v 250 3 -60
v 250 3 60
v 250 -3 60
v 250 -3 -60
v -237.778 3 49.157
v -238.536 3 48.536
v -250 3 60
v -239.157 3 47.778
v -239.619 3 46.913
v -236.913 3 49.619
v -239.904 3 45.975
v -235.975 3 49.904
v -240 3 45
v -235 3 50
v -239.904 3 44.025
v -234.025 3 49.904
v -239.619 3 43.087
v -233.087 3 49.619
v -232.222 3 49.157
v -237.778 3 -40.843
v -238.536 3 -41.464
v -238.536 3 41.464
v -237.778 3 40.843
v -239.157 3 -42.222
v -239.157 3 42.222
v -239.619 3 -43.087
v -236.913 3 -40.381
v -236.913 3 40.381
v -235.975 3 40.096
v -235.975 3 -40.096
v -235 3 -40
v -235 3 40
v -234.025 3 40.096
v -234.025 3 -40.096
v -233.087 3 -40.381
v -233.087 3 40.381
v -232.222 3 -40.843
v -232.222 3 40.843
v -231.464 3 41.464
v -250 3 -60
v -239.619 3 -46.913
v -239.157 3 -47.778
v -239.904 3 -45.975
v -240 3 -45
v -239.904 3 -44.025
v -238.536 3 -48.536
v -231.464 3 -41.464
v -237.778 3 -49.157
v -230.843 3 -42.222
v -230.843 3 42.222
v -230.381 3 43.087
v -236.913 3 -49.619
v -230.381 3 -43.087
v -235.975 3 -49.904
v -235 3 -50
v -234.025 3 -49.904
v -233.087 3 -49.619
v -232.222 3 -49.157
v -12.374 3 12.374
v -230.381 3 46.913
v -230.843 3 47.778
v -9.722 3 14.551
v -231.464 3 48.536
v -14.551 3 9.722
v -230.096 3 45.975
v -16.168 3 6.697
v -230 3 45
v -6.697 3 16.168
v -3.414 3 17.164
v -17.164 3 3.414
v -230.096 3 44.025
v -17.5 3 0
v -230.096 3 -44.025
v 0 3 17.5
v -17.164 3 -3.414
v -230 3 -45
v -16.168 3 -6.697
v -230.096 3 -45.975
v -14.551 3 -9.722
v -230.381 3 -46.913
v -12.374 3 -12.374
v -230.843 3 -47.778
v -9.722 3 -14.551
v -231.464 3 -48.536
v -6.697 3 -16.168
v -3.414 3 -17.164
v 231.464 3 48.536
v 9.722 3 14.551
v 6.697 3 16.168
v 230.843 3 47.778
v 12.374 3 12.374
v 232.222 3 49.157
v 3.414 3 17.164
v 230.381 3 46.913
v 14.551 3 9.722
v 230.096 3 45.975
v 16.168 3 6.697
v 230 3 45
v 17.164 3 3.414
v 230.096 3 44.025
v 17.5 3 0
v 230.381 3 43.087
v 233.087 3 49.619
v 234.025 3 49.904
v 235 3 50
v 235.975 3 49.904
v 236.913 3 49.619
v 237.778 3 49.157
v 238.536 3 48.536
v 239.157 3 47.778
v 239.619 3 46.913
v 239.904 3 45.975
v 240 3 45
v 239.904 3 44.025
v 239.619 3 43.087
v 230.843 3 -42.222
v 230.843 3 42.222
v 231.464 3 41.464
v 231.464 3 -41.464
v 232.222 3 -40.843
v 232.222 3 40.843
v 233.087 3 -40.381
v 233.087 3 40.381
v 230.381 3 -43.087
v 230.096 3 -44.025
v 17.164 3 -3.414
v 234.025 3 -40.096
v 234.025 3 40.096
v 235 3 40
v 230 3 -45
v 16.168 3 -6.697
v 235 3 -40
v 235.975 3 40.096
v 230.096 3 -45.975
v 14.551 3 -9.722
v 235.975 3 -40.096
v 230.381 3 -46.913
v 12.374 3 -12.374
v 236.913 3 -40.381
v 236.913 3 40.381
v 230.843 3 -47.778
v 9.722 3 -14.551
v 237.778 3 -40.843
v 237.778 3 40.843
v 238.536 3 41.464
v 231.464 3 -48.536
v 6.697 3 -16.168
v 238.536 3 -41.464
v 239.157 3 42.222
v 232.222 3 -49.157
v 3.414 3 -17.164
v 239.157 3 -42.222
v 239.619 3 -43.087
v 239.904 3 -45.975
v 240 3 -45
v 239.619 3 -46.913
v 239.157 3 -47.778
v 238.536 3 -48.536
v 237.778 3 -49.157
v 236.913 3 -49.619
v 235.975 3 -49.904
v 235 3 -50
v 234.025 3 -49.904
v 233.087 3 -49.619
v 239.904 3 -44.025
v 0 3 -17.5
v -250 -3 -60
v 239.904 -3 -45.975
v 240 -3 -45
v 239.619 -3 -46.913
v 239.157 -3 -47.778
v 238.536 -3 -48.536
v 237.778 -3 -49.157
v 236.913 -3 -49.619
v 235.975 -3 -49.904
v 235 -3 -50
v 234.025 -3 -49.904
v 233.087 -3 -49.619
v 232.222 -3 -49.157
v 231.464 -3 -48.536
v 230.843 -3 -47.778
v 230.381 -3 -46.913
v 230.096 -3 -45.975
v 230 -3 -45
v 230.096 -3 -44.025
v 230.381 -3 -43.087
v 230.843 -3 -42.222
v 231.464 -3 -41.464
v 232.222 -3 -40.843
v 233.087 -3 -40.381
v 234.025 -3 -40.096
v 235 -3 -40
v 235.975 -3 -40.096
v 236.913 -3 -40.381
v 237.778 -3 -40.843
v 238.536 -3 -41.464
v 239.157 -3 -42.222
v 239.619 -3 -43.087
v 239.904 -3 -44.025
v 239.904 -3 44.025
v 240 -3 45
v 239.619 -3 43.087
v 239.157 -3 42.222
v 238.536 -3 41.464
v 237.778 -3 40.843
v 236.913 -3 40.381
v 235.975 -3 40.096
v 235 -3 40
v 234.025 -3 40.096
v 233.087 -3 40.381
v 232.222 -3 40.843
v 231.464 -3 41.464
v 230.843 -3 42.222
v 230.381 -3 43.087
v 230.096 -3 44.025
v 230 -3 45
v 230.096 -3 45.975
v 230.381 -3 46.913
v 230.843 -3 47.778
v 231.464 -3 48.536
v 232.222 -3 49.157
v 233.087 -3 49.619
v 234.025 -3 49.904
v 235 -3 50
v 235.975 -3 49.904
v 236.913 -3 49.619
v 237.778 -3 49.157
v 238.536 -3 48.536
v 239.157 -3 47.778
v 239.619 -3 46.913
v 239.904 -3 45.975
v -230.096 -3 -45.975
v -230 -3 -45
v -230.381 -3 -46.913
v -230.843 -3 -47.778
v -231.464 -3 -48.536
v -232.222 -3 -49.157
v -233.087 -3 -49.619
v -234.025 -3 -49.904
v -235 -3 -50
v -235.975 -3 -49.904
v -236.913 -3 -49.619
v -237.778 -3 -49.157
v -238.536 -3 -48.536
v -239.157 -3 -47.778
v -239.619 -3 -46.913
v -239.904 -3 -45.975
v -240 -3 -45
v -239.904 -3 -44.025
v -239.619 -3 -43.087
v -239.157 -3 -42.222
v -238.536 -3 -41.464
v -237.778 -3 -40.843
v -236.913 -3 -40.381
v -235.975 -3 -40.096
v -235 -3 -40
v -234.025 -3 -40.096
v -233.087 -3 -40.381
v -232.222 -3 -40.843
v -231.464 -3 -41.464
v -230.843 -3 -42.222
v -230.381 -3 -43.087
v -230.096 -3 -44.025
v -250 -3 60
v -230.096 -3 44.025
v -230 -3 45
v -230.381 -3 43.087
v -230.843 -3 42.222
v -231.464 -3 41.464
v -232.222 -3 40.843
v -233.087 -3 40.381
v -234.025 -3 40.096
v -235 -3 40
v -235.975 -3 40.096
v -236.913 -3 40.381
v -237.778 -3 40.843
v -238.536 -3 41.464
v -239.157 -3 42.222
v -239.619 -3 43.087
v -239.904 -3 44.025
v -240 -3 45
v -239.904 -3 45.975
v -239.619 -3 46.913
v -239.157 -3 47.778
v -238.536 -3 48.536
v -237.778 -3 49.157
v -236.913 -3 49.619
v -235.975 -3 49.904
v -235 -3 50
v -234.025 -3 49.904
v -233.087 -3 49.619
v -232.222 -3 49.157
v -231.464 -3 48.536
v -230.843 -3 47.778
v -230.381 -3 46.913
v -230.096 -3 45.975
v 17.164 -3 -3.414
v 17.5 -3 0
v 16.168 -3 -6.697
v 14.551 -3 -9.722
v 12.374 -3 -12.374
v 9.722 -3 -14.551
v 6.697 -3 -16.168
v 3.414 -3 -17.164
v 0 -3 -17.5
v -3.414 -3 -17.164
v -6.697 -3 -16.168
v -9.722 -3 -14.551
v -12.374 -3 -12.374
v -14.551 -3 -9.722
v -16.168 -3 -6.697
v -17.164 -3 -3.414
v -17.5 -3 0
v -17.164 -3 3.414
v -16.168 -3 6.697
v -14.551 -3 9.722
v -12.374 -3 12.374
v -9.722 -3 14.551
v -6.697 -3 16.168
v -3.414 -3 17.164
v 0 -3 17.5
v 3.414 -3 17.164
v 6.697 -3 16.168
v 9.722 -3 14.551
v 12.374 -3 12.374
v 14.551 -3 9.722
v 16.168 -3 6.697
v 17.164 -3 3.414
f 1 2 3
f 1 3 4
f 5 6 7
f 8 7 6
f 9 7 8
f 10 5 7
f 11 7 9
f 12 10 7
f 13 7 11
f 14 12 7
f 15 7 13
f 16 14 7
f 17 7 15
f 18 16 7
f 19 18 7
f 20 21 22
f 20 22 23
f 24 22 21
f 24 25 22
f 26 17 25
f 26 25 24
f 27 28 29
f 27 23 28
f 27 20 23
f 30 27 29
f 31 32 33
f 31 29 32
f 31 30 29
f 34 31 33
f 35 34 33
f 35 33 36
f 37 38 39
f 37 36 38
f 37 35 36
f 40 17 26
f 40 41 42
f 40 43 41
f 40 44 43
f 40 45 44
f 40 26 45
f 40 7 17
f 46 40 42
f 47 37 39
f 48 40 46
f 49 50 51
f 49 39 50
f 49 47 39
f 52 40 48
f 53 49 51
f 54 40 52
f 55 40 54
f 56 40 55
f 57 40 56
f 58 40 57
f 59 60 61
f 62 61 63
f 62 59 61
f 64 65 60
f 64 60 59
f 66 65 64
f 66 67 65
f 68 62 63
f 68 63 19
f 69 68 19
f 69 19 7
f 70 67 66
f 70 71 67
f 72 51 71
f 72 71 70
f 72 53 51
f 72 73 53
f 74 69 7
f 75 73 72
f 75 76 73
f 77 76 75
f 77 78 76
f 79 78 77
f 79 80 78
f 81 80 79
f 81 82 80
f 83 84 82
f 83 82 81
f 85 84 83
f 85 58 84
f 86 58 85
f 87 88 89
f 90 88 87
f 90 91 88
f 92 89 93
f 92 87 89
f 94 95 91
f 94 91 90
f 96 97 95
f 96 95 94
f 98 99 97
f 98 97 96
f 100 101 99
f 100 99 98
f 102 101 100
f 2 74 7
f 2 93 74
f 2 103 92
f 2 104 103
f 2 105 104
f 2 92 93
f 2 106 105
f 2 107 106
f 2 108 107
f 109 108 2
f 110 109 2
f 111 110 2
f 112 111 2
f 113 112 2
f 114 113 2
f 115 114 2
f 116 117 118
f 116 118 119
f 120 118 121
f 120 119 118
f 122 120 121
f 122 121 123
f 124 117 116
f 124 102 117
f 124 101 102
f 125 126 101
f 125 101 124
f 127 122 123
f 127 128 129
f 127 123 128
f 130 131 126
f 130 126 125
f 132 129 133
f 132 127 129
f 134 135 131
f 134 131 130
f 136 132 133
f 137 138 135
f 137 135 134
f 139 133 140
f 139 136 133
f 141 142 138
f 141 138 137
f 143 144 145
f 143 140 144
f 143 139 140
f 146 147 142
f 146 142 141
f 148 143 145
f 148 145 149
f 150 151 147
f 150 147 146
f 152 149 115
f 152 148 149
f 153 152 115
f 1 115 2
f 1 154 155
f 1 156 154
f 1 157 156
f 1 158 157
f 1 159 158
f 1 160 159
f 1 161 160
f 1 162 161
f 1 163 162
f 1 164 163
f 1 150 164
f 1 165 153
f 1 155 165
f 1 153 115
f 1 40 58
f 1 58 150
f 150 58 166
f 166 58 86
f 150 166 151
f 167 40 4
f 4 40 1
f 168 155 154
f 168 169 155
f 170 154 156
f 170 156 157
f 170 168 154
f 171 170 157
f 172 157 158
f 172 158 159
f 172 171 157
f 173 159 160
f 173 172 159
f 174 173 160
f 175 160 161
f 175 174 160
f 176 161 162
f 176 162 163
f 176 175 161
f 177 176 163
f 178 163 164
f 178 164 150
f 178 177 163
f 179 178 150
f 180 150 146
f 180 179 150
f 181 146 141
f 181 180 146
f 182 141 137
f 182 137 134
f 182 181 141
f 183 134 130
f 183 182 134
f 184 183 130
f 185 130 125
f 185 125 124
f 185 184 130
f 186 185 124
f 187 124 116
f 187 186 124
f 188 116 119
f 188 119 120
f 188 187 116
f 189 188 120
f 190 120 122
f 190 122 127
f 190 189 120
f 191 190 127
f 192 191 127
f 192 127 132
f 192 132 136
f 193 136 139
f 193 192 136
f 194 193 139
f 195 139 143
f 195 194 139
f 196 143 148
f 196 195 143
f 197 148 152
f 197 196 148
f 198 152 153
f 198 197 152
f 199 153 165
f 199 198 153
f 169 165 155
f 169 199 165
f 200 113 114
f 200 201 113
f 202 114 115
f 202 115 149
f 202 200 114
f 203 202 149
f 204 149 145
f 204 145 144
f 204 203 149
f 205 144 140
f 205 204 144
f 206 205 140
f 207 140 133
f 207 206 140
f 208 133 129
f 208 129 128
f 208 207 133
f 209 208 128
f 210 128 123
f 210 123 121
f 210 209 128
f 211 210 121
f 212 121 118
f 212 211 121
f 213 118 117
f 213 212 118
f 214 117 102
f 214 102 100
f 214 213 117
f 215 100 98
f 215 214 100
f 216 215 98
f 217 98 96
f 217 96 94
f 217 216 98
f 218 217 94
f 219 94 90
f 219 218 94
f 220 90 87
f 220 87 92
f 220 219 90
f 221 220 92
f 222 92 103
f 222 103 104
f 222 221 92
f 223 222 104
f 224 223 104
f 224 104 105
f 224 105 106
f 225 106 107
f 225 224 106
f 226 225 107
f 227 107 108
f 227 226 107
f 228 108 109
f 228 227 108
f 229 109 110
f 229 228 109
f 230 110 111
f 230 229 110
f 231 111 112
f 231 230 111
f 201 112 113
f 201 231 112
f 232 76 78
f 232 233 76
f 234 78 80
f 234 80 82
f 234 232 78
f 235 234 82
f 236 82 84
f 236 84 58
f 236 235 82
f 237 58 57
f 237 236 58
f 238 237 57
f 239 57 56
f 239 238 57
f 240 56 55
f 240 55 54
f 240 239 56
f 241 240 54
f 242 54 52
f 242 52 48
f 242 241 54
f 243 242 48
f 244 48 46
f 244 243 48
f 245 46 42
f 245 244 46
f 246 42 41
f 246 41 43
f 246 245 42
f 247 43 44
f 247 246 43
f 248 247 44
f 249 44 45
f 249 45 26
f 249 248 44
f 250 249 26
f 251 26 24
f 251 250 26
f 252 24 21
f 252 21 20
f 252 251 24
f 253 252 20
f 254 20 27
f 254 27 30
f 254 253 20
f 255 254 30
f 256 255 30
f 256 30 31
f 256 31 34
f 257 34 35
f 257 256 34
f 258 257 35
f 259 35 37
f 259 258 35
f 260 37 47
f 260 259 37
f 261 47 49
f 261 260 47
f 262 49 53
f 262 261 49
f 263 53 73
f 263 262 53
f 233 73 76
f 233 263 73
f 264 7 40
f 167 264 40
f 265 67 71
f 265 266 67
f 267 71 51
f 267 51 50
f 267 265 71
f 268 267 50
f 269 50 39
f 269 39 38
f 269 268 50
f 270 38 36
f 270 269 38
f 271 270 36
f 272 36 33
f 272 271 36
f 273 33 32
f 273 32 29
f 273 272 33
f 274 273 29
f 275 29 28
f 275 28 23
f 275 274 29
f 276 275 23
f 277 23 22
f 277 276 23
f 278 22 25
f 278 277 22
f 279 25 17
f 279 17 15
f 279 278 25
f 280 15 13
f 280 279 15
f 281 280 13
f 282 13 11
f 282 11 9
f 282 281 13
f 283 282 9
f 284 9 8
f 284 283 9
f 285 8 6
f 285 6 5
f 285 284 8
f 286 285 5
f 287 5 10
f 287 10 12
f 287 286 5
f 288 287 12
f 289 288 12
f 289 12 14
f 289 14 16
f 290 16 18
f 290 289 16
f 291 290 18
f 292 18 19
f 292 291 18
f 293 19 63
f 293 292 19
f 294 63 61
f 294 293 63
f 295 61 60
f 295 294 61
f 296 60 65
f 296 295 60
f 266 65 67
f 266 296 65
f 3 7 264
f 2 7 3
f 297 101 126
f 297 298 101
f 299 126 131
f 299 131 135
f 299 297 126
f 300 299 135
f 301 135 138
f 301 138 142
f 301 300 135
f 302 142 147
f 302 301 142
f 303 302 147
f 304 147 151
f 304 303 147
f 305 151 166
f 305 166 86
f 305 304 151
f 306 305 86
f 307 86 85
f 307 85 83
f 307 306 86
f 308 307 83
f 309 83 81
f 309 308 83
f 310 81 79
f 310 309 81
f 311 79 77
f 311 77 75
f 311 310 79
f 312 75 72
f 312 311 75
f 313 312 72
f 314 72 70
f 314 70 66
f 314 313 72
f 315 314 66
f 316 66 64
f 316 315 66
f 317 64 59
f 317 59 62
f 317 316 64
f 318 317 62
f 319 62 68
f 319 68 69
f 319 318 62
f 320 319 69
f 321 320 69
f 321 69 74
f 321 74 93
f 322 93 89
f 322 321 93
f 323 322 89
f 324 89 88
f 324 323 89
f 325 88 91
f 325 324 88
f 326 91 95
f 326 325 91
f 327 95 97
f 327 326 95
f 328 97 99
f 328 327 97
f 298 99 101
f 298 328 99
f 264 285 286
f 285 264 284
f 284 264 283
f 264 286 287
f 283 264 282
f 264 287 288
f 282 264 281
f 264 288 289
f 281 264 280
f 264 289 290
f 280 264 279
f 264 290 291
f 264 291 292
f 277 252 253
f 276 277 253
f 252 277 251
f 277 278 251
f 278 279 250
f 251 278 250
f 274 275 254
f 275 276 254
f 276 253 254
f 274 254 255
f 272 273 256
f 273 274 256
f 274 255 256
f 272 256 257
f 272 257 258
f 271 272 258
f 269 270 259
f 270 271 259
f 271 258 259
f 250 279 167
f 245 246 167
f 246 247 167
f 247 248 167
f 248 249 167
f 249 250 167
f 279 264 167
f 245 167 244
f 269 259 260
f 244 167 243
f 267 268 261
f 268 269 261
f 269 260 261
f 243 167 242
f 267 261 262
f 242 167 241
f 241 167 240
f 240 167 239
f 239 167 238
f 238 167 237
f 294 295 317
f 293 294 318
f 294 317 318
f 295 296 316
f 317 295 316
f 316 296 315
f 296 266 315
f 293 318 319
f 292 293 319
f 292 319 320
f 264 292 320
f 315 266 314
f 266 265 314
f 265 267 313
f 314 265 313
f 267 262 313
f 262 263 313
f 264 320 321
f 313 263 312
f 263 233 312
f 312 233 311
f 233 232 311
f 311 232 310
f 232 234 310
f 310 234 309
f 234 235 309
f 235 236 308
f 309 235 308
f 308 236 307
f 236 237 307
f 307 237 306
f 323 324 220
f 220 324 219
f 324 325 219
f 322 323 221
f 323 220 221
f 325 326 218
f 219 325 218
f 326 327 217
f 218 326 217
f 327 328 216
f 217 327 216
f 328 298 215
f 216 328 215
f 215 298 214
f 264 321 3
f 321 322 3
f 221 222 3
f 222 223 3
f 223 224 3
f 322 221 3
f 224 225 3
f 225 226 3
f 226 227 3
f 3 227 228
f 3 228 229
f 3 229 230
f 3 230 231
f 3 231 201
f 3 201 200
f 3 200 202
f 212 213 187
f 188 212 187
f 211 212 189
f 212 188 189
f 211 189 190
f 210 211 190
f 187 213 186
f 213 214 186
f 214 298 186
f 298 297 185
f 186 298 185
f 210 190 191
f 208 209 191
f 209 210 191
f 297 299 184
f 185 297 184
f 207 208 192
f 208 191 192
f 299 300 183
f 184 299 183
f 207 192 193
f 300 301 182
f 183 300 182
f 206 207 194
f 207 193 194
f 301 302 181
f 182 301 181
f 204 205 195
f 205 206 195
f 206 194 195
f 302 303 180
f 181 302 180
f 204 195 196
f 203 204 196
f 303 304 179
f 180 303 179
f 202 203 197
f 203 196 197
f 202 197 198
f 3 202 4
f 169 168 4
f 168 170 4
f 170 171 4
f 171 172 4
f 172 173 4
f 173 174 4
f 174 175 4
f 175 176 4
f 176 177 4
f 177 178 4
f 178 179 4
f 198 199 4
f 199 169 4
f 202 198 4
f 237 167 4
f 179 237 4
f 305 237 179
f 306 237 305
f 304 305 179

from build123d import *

# Parameters (mm, degrees)
SKETCH1_W           = 500
SKETCH1_H           = 120
SKETCH1_R           = 17.5
SKETCH1_R_2         = 5
BOSS_EXTRUDE1_DEPTH = 3


with BuildPart() as part:
    # Sketch1 → Boss-Extrude1 (new body, symmetric)
    with BuildSketch(Plane(origin=(0, 0, 0), x_dir=(1, 0, 0), z_dir=(0, 1, 0))):
        Rectangle(SKETCH1_W, SKETCH1_H)
        Circle(SKETCH1_R, mode=Mode.SUBTRACT)
        with Locations((-235, 45)):
            Circle(SKETCH1_R_2, mode=Mode.SUBTRACT)
        with Locations((-235, -45)):
            Circle(SKETCH1_R_2, mode=Mode.SUBTRACT)
        with Locations((235, 45)):
            Circle(SKETCH1_R_2, mode=Mode.SUBTRACT)
        with Locations((235, -45)):
            Circle(SKETCH1_R_2, mode=Mode.SUBTRACT)
    extrude(amount=BOSS_EXTRUDE1_DEPTH, both=True)


solid = part.part
